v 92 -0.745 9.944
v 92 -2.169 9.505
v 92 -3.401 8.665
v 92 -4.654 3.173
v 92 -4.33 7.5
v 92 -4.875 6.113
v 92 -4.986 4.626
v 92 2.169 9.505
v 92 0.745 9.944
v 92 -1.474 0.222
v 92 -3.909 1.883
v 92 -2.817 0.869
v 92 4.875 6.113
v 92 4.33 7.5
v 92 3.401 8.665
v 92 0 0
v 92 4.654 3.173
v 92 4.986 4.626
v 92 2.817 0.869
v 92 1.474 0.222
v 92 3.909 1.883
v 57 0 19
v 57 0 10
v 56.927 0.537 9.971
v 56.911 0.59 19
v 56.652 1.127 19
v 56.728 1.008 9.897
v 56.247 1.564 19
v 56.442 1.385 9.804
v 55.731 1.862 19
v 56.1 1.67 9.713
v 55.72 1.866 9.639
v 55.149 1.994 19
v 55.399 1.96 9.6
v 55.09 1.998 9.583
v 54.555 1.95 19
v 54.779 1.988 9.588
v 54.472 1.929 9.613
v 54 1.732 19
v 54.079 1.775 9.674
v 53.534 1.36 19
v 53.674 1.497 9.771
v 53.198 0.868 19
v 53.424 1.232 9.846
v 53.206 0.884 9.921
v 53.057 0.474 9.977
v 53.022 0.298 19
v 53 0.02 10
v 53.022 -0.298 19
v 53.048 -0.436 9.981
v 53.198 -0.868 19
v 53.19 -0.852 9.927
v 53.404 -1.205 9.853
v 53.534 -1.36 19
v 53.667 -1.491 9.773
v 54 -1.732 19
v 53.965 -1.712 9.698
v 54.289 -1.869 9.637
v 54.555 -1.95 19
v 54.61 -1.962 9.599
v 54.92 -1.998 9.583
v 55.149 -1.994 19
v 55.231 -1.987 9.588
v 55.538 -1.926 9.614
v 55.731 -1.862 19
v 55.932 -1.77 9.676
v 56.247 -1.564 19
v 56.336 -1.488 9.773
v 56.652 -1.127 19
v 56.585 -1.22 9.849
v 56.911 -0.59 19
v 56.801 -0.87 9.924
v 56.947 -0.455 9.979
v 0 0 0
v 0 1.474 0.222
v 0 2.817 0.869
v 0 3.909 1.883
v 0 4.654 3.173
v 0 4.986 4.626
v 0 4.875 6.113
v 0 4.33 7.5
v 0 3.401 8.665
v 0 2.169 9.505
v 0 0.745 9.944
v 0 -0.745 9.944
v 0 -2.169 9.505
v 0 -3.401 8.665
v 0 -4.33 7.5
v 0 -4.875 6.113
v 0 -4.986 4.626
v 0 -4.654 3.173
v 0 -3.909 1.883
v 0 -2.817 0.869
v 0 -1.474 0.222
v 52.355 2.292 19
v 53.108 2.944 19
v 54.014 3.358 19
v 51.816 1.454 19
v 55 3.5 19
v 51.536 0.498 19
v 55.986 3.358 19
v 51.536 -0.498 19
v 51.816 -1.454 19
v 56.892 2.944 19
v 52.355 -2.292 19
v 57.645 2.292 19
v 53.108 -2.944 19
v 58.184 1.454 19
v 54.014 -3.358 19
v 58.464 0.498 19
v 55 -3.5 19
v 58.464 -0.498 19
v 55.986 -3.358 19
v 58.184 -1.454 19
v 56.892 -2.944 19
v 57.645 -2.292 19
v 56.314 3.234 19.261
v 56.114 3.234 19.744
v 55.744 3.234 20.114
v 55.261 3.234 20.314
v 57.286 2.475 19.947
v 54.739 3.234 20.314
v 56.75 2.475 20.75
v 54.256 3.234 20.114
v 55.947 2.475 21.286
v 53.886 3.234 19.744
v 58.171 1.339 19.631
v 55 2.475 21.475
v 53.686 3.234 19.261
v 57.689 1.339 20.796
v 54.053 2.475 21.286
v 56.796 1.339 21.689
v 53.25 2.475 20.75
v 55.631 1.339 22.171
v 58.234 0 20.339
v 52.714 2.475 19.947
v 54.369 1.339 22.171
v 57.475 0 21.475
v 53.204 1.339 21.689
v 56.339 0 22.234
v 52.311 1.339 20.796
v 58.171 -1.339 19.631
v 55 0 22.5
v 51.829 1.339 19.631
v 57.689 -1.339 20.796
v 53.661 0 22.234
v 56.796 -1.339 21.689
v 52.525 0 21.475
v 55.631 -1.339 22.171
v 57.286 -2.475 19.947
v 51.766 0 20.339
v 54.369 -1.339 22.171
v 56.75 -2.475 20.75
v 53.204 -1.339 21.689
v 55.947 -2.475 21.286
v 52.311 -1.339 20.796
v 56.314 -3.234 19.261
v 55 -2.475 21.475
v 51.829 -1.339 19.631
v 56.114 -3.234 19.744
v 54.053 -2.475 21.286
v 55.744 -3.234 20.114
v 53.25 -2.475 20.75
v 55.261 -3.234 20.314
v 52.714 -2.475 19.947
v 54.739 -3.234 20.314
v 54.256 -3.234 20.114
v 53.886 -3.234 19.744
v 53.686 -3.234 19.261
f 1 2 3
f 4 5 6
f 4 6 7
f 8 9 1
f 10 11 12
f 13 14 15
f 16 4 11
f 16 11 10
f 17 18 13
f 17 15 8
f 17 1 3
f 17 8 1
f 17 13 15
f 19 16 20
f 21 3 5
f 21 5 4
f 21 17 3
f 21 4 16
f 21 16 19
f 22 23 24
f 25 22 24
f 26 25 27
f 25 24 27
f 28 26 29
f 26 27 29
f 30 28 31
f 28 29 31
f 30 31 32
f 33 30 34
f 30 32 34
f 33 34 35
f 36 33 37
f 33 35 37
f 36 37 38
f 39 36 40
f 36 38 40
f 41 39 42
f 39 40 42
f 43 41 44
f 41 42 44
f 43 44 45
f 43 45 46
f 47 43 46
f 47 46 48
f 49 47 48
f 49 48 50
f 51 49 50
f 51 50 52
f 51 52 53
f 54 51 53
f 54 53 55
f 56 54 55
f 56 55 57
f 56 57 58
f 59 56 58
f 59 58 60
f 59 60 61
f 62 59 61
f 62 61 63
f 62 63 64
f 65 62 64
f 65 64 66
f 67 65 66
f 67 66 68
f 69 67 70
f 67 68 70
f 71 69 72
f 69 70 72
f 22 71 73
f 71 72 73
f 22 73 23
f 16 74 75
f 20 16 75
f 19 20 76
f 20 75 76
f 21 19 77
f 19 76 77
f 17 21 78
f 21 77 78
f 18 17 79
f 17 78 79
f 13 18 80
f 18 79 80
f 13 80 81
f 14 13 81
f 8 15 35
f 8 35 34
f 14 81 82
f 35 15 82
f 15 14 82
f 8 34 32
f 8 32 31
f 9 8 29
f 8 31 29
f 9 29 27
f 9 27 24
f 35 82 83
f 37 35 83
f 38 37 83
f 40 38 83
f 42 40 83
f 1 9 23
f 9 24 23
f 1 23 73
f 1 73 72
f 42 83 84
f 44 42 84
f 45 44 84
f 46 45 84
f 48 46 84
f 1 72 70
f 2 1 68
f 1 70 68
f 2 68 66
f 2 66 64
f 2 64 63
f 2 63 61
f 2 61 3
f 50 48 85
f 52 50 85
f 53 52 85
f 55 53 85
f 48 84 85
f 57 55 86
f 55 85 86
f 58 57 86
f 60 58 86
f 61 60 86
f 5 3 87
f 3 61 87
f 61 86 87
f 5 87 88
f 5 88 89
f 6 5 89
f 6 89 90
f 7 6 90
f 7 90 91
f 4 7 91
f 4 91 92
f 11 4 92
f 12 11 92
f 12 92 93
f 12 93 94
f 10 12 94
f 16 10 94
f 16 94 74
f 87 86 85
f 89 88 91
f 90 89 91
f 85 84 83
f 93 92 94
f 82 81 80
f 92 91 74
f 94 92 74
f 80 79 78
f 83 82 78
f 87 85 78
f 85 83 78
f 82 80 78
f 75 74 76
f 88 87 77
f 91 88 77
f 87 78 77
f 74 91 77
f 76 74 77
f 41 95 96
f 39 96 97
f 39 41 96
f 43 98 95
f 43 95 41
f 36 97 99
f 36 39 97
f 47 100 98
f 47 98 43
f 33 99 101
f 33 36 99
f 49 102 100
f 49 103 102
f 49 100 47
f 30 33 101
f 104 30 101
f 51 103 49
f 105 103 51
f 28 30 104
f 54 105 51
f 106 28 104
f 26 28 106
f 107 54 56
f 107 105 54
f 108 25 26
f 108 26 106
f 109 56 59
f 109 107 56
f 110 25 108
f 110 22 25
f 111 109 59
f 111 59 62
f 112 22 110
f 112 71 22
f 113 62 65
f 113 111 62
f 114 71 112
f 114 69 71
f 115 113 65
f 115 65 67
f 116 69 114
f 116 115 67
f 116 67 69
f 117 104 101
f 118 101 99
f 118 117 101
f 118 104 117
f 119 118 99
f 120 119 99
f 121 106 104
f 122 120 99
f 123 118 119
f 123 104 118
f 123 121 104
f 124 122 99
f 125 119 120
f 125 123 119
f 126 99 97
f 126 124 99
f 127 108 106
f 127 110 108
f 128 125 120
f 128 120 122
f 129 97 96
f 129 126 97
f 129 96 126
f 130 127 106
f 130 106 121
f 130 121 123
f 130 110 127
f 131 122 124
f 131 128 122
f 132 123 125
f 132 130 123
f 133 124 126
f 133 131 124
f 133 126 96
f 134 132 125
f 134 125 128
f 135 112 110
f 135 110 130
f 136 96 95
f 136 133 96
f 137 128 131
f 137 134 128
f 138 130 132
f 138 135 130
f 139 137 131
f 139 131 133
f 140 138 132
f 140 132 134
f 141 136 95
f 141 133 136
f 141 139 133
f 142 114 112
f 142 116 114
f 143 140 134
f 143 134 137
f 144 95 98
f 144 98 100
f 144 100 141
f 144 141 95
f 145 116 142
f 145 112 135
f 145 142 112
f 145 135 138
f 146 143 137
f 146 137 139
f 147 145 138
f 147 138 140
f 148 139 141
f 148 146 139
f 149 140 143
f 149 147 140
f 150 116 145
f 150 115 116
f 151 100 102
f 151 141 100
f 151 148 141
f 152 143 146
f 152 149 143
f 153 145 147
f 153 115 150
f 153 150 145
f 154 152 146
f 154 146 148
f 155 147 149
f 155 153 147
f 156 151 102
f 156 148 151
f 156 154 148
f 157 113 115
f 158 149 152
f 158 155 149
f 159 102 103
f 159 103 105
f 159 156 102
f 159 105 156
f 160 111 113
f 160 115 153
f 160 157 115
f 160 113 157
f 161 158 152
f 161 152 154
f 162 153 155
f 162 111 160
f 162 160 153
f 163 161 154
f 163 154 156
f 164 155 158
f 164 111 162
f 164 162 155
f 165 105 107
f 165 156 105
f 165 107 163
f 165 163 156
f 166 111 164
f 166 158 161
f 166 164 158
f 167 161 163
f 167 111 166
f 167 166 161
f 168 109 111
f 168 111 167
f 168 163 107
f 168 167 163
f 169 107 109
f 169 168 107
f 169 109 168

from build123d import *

# Parameters (mm, degrees)
SPHERE_ANGLE         = 180
SPHERE_ROLL_ANGLE    = 90
CYLINDER001_R        = 2
CYLINDER001_DEPTH    = 10
CYLINDER_R           = 5
CYLINDER_DEPTH       = 92
CYLINDER_PITCH_ANGLE = 90


with BuildPart() as sphere:
    # Sphere → Sphere (revolve)
    with BuildSketch(Plane.XZ):
        with BuildLine():
            ThreePointArc((0, -3.5), (3.5, 0), (0, 3.5))
            Line((0, 3.5), (0, -3.5))
        make_face()
    revolve(axis=Axis((0, 0, 0), (0, 0, 1)), revolution_arc=SPHERE_ANGLE)


with BuildPart() as sphere_1:
    # Sphere roll: moved
    add(sphere.part.rotate(Axis((0, 0, 0), (1, 0, 0)), SPHERE_ROLL_ANGLE))


with BuildPart() as sphere_2:
    # Sphere placement: moved
    add(sphere_1.part.moved(Location((55, 0, 19))))


with BuildPart() as cylinder001:
    # Cylinder001 → Cylinder001 (new body)
    with BuildSketch(Plane(origin=(55, 0, 9), x_dir=(1, 0, 0), z_dir=(0, 0, 1))):
        Circle(CYLINDER001_R)
    extrude(amount=CYLINDER001_DEPTH)


with BuildPart() as fusion001:
    # Cylinder → Cylinder (new body)
    with BuildSketch(Plane.XY):
        Circle(CYLINDER_R)
    extrude(amount=CYLINDER_DEPTH)


with BuildPart() as fusion001_1:
    # Cylinder pitch: moved
    add(fusion001.part.rotate(Axis((0, 0, 0), (0, 1, 0)), CYLINDER_PITCH_ANGLE))


with BuildPart() as fusion001_2:
    # Cylinder placement: moved
    add(fusion001_1.part.moved(Location((0, 0, 5))))

    # Fusion: union Cylinder001
    add(cylinder001.part)

    # Fusion001: union Sphere
    add(sphere_2.part)


solid = fusion001_2.part
